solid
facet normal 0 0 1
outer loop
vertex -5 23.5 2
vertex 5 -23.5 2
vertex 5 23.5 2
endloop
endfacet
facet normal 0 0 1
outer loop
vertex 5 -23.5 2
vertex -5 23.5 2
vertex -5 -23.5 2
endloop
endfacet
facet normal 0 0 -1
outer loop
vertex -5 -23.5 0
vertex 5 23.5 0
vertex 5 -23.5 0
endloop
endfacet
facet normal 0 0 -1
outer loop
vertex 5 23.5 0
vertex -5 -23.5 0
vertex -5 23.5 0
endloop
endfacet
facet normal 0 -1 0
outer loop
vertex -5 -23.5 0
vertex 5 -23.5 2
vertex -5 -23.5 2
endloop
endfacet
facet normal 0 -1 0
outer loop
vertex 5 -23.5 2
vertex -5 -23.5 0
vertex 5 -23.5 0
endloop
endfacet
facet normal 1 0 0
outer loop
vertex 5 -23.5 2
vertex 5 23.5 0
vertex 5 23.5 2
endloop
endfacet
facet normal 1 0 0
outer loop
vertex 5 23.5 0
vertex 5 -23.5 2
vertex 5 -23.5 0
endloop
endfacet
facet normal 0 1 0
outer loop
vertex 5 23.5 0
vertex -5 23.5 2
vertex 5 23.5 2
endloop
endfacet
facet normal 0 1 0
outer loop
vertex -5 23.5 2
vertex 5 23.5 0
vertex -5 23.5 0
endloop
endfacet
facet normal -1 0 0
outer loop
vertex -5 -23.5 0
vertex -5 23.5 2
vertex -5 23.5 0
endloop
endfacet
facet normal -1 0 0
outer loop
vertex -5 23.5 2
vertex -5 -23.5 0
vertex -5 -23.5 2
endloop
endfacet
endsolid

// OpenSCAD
// file: ../lib/label.scad
// SPDX-License-Identifier: MIT
// Copyright (c) 2026 Aaron Cupp
//
// label.scad — two-colour flat-inset text labels, shared across the bench system.
//
// Generalizes the technique proven in donation-qr-stand/: the text is a recessed
// pocket in the light part, filled flush by a matching inlay printed in the dark
// colour. On a multi-toolhead printer (Snapmaker U1) load both parts at the same
// origin and assign a colour to each. Flush beats raised relief — nothing to
// catch, nothing to peel, and it survives an IPA wipe, which a printed sticker
// does not.
//
// Both modules emit the label occupying z ∈ [-LABEL_T, 0], so the caller
// translates to the face being labelled and the inlay tops out flush:
//
//     difference() { my_bin(); translate([0, 30, top_z]) label_pocket("0.45"); }
//     translate([0, 30, top_z]) label_inlay("0.45");            // dark part
//
// Single-colour fallback: label_pocket() alone gives an engraved label that
// still reads, just without the contrast.

LABEL_T    = 0.8;                            // pocket depth = inlay thickness
LABEL_FONT = "Liberation Sans:style=Bold";   // renders locally and in CI
_L_EPS     = 0.02;                           // pocket overrun so difference() is clean

// 2D text outline, centred on the origin by default.
module label_2d(txt, size = 6, font = LABEL_FONT, halign = "center", valign = "center") {
    text(txt, size = size, font = font, halign = halign, valign = valign);
}

// Solid to SUBTRACT from the light part. Overruns the face so the cut is clean.
module label_pocket(txt, size = 6, depth = LABEL_T, font = LABEL_FONT,
                    halign = "center", valign = "center") {
    translate([0, 0, -depth])
        linear_extrude(depth + _L_EPS) label_2d(txt, size, font, halign, valign);
}

// Solid to ADD to the dark part. Fills the pocket flush — no overrun.
module label_inlay(txt, size = 6, depth = LABEL_T, font = LABEL_FONT,
                   halign = "center", valign = "center") {
    translate([0, 0, -depth])
        linear_extrude(depth) label_2d(txt, size, font, halign, valign);
}

// Same pair for a text label on a VERTICAL face (bin front, divider tab), where
// the labelled surface faces +Y. Label occupies y ∈ [-LABEL_T, 0].
module label_pocket_v(txt, size = 6, depth = LABEL_T, font = LABEL_FONT) {
    rotate([90, 0, 0]) translate([0, 0, -_L_EPS])
        linear_extrude(depth + _L_EPS) label_2d(txt, size, font);
}

module label_inlay_v(txt, size = 6, depth = LABEL_T, font = LABEL_FONT) {
    rotate([90, 0, 0]) linear_extrude(depth) label_2d(txt, size, font);
}
// main file
// rig_bin_key.scad — locates the storage bin on the deck. Print 2.
//
// A flat key, CA'd into one of the deck's two empty rail pockets (10.4 x 47.4 x
// 1.2) so it stands 0.8 mm proud; the storage bin's underside recesses drop
// over the pair. Print flat, no supports, ~1 g each.

include <rig_common.scad>

module rig_bin_key() { translate([-KEY_W/2, -KEY_L/2, 0]) cube([KEY_W, KEY_L, KEY_H]); }

rig_bin_key();
echo(str("rig_bin_key: ", KEY_W, " x ", KEY_L, " x ", KEY_H, " mm — 1.2 in the pocket, ", KEY_PROUD, " proud"));
